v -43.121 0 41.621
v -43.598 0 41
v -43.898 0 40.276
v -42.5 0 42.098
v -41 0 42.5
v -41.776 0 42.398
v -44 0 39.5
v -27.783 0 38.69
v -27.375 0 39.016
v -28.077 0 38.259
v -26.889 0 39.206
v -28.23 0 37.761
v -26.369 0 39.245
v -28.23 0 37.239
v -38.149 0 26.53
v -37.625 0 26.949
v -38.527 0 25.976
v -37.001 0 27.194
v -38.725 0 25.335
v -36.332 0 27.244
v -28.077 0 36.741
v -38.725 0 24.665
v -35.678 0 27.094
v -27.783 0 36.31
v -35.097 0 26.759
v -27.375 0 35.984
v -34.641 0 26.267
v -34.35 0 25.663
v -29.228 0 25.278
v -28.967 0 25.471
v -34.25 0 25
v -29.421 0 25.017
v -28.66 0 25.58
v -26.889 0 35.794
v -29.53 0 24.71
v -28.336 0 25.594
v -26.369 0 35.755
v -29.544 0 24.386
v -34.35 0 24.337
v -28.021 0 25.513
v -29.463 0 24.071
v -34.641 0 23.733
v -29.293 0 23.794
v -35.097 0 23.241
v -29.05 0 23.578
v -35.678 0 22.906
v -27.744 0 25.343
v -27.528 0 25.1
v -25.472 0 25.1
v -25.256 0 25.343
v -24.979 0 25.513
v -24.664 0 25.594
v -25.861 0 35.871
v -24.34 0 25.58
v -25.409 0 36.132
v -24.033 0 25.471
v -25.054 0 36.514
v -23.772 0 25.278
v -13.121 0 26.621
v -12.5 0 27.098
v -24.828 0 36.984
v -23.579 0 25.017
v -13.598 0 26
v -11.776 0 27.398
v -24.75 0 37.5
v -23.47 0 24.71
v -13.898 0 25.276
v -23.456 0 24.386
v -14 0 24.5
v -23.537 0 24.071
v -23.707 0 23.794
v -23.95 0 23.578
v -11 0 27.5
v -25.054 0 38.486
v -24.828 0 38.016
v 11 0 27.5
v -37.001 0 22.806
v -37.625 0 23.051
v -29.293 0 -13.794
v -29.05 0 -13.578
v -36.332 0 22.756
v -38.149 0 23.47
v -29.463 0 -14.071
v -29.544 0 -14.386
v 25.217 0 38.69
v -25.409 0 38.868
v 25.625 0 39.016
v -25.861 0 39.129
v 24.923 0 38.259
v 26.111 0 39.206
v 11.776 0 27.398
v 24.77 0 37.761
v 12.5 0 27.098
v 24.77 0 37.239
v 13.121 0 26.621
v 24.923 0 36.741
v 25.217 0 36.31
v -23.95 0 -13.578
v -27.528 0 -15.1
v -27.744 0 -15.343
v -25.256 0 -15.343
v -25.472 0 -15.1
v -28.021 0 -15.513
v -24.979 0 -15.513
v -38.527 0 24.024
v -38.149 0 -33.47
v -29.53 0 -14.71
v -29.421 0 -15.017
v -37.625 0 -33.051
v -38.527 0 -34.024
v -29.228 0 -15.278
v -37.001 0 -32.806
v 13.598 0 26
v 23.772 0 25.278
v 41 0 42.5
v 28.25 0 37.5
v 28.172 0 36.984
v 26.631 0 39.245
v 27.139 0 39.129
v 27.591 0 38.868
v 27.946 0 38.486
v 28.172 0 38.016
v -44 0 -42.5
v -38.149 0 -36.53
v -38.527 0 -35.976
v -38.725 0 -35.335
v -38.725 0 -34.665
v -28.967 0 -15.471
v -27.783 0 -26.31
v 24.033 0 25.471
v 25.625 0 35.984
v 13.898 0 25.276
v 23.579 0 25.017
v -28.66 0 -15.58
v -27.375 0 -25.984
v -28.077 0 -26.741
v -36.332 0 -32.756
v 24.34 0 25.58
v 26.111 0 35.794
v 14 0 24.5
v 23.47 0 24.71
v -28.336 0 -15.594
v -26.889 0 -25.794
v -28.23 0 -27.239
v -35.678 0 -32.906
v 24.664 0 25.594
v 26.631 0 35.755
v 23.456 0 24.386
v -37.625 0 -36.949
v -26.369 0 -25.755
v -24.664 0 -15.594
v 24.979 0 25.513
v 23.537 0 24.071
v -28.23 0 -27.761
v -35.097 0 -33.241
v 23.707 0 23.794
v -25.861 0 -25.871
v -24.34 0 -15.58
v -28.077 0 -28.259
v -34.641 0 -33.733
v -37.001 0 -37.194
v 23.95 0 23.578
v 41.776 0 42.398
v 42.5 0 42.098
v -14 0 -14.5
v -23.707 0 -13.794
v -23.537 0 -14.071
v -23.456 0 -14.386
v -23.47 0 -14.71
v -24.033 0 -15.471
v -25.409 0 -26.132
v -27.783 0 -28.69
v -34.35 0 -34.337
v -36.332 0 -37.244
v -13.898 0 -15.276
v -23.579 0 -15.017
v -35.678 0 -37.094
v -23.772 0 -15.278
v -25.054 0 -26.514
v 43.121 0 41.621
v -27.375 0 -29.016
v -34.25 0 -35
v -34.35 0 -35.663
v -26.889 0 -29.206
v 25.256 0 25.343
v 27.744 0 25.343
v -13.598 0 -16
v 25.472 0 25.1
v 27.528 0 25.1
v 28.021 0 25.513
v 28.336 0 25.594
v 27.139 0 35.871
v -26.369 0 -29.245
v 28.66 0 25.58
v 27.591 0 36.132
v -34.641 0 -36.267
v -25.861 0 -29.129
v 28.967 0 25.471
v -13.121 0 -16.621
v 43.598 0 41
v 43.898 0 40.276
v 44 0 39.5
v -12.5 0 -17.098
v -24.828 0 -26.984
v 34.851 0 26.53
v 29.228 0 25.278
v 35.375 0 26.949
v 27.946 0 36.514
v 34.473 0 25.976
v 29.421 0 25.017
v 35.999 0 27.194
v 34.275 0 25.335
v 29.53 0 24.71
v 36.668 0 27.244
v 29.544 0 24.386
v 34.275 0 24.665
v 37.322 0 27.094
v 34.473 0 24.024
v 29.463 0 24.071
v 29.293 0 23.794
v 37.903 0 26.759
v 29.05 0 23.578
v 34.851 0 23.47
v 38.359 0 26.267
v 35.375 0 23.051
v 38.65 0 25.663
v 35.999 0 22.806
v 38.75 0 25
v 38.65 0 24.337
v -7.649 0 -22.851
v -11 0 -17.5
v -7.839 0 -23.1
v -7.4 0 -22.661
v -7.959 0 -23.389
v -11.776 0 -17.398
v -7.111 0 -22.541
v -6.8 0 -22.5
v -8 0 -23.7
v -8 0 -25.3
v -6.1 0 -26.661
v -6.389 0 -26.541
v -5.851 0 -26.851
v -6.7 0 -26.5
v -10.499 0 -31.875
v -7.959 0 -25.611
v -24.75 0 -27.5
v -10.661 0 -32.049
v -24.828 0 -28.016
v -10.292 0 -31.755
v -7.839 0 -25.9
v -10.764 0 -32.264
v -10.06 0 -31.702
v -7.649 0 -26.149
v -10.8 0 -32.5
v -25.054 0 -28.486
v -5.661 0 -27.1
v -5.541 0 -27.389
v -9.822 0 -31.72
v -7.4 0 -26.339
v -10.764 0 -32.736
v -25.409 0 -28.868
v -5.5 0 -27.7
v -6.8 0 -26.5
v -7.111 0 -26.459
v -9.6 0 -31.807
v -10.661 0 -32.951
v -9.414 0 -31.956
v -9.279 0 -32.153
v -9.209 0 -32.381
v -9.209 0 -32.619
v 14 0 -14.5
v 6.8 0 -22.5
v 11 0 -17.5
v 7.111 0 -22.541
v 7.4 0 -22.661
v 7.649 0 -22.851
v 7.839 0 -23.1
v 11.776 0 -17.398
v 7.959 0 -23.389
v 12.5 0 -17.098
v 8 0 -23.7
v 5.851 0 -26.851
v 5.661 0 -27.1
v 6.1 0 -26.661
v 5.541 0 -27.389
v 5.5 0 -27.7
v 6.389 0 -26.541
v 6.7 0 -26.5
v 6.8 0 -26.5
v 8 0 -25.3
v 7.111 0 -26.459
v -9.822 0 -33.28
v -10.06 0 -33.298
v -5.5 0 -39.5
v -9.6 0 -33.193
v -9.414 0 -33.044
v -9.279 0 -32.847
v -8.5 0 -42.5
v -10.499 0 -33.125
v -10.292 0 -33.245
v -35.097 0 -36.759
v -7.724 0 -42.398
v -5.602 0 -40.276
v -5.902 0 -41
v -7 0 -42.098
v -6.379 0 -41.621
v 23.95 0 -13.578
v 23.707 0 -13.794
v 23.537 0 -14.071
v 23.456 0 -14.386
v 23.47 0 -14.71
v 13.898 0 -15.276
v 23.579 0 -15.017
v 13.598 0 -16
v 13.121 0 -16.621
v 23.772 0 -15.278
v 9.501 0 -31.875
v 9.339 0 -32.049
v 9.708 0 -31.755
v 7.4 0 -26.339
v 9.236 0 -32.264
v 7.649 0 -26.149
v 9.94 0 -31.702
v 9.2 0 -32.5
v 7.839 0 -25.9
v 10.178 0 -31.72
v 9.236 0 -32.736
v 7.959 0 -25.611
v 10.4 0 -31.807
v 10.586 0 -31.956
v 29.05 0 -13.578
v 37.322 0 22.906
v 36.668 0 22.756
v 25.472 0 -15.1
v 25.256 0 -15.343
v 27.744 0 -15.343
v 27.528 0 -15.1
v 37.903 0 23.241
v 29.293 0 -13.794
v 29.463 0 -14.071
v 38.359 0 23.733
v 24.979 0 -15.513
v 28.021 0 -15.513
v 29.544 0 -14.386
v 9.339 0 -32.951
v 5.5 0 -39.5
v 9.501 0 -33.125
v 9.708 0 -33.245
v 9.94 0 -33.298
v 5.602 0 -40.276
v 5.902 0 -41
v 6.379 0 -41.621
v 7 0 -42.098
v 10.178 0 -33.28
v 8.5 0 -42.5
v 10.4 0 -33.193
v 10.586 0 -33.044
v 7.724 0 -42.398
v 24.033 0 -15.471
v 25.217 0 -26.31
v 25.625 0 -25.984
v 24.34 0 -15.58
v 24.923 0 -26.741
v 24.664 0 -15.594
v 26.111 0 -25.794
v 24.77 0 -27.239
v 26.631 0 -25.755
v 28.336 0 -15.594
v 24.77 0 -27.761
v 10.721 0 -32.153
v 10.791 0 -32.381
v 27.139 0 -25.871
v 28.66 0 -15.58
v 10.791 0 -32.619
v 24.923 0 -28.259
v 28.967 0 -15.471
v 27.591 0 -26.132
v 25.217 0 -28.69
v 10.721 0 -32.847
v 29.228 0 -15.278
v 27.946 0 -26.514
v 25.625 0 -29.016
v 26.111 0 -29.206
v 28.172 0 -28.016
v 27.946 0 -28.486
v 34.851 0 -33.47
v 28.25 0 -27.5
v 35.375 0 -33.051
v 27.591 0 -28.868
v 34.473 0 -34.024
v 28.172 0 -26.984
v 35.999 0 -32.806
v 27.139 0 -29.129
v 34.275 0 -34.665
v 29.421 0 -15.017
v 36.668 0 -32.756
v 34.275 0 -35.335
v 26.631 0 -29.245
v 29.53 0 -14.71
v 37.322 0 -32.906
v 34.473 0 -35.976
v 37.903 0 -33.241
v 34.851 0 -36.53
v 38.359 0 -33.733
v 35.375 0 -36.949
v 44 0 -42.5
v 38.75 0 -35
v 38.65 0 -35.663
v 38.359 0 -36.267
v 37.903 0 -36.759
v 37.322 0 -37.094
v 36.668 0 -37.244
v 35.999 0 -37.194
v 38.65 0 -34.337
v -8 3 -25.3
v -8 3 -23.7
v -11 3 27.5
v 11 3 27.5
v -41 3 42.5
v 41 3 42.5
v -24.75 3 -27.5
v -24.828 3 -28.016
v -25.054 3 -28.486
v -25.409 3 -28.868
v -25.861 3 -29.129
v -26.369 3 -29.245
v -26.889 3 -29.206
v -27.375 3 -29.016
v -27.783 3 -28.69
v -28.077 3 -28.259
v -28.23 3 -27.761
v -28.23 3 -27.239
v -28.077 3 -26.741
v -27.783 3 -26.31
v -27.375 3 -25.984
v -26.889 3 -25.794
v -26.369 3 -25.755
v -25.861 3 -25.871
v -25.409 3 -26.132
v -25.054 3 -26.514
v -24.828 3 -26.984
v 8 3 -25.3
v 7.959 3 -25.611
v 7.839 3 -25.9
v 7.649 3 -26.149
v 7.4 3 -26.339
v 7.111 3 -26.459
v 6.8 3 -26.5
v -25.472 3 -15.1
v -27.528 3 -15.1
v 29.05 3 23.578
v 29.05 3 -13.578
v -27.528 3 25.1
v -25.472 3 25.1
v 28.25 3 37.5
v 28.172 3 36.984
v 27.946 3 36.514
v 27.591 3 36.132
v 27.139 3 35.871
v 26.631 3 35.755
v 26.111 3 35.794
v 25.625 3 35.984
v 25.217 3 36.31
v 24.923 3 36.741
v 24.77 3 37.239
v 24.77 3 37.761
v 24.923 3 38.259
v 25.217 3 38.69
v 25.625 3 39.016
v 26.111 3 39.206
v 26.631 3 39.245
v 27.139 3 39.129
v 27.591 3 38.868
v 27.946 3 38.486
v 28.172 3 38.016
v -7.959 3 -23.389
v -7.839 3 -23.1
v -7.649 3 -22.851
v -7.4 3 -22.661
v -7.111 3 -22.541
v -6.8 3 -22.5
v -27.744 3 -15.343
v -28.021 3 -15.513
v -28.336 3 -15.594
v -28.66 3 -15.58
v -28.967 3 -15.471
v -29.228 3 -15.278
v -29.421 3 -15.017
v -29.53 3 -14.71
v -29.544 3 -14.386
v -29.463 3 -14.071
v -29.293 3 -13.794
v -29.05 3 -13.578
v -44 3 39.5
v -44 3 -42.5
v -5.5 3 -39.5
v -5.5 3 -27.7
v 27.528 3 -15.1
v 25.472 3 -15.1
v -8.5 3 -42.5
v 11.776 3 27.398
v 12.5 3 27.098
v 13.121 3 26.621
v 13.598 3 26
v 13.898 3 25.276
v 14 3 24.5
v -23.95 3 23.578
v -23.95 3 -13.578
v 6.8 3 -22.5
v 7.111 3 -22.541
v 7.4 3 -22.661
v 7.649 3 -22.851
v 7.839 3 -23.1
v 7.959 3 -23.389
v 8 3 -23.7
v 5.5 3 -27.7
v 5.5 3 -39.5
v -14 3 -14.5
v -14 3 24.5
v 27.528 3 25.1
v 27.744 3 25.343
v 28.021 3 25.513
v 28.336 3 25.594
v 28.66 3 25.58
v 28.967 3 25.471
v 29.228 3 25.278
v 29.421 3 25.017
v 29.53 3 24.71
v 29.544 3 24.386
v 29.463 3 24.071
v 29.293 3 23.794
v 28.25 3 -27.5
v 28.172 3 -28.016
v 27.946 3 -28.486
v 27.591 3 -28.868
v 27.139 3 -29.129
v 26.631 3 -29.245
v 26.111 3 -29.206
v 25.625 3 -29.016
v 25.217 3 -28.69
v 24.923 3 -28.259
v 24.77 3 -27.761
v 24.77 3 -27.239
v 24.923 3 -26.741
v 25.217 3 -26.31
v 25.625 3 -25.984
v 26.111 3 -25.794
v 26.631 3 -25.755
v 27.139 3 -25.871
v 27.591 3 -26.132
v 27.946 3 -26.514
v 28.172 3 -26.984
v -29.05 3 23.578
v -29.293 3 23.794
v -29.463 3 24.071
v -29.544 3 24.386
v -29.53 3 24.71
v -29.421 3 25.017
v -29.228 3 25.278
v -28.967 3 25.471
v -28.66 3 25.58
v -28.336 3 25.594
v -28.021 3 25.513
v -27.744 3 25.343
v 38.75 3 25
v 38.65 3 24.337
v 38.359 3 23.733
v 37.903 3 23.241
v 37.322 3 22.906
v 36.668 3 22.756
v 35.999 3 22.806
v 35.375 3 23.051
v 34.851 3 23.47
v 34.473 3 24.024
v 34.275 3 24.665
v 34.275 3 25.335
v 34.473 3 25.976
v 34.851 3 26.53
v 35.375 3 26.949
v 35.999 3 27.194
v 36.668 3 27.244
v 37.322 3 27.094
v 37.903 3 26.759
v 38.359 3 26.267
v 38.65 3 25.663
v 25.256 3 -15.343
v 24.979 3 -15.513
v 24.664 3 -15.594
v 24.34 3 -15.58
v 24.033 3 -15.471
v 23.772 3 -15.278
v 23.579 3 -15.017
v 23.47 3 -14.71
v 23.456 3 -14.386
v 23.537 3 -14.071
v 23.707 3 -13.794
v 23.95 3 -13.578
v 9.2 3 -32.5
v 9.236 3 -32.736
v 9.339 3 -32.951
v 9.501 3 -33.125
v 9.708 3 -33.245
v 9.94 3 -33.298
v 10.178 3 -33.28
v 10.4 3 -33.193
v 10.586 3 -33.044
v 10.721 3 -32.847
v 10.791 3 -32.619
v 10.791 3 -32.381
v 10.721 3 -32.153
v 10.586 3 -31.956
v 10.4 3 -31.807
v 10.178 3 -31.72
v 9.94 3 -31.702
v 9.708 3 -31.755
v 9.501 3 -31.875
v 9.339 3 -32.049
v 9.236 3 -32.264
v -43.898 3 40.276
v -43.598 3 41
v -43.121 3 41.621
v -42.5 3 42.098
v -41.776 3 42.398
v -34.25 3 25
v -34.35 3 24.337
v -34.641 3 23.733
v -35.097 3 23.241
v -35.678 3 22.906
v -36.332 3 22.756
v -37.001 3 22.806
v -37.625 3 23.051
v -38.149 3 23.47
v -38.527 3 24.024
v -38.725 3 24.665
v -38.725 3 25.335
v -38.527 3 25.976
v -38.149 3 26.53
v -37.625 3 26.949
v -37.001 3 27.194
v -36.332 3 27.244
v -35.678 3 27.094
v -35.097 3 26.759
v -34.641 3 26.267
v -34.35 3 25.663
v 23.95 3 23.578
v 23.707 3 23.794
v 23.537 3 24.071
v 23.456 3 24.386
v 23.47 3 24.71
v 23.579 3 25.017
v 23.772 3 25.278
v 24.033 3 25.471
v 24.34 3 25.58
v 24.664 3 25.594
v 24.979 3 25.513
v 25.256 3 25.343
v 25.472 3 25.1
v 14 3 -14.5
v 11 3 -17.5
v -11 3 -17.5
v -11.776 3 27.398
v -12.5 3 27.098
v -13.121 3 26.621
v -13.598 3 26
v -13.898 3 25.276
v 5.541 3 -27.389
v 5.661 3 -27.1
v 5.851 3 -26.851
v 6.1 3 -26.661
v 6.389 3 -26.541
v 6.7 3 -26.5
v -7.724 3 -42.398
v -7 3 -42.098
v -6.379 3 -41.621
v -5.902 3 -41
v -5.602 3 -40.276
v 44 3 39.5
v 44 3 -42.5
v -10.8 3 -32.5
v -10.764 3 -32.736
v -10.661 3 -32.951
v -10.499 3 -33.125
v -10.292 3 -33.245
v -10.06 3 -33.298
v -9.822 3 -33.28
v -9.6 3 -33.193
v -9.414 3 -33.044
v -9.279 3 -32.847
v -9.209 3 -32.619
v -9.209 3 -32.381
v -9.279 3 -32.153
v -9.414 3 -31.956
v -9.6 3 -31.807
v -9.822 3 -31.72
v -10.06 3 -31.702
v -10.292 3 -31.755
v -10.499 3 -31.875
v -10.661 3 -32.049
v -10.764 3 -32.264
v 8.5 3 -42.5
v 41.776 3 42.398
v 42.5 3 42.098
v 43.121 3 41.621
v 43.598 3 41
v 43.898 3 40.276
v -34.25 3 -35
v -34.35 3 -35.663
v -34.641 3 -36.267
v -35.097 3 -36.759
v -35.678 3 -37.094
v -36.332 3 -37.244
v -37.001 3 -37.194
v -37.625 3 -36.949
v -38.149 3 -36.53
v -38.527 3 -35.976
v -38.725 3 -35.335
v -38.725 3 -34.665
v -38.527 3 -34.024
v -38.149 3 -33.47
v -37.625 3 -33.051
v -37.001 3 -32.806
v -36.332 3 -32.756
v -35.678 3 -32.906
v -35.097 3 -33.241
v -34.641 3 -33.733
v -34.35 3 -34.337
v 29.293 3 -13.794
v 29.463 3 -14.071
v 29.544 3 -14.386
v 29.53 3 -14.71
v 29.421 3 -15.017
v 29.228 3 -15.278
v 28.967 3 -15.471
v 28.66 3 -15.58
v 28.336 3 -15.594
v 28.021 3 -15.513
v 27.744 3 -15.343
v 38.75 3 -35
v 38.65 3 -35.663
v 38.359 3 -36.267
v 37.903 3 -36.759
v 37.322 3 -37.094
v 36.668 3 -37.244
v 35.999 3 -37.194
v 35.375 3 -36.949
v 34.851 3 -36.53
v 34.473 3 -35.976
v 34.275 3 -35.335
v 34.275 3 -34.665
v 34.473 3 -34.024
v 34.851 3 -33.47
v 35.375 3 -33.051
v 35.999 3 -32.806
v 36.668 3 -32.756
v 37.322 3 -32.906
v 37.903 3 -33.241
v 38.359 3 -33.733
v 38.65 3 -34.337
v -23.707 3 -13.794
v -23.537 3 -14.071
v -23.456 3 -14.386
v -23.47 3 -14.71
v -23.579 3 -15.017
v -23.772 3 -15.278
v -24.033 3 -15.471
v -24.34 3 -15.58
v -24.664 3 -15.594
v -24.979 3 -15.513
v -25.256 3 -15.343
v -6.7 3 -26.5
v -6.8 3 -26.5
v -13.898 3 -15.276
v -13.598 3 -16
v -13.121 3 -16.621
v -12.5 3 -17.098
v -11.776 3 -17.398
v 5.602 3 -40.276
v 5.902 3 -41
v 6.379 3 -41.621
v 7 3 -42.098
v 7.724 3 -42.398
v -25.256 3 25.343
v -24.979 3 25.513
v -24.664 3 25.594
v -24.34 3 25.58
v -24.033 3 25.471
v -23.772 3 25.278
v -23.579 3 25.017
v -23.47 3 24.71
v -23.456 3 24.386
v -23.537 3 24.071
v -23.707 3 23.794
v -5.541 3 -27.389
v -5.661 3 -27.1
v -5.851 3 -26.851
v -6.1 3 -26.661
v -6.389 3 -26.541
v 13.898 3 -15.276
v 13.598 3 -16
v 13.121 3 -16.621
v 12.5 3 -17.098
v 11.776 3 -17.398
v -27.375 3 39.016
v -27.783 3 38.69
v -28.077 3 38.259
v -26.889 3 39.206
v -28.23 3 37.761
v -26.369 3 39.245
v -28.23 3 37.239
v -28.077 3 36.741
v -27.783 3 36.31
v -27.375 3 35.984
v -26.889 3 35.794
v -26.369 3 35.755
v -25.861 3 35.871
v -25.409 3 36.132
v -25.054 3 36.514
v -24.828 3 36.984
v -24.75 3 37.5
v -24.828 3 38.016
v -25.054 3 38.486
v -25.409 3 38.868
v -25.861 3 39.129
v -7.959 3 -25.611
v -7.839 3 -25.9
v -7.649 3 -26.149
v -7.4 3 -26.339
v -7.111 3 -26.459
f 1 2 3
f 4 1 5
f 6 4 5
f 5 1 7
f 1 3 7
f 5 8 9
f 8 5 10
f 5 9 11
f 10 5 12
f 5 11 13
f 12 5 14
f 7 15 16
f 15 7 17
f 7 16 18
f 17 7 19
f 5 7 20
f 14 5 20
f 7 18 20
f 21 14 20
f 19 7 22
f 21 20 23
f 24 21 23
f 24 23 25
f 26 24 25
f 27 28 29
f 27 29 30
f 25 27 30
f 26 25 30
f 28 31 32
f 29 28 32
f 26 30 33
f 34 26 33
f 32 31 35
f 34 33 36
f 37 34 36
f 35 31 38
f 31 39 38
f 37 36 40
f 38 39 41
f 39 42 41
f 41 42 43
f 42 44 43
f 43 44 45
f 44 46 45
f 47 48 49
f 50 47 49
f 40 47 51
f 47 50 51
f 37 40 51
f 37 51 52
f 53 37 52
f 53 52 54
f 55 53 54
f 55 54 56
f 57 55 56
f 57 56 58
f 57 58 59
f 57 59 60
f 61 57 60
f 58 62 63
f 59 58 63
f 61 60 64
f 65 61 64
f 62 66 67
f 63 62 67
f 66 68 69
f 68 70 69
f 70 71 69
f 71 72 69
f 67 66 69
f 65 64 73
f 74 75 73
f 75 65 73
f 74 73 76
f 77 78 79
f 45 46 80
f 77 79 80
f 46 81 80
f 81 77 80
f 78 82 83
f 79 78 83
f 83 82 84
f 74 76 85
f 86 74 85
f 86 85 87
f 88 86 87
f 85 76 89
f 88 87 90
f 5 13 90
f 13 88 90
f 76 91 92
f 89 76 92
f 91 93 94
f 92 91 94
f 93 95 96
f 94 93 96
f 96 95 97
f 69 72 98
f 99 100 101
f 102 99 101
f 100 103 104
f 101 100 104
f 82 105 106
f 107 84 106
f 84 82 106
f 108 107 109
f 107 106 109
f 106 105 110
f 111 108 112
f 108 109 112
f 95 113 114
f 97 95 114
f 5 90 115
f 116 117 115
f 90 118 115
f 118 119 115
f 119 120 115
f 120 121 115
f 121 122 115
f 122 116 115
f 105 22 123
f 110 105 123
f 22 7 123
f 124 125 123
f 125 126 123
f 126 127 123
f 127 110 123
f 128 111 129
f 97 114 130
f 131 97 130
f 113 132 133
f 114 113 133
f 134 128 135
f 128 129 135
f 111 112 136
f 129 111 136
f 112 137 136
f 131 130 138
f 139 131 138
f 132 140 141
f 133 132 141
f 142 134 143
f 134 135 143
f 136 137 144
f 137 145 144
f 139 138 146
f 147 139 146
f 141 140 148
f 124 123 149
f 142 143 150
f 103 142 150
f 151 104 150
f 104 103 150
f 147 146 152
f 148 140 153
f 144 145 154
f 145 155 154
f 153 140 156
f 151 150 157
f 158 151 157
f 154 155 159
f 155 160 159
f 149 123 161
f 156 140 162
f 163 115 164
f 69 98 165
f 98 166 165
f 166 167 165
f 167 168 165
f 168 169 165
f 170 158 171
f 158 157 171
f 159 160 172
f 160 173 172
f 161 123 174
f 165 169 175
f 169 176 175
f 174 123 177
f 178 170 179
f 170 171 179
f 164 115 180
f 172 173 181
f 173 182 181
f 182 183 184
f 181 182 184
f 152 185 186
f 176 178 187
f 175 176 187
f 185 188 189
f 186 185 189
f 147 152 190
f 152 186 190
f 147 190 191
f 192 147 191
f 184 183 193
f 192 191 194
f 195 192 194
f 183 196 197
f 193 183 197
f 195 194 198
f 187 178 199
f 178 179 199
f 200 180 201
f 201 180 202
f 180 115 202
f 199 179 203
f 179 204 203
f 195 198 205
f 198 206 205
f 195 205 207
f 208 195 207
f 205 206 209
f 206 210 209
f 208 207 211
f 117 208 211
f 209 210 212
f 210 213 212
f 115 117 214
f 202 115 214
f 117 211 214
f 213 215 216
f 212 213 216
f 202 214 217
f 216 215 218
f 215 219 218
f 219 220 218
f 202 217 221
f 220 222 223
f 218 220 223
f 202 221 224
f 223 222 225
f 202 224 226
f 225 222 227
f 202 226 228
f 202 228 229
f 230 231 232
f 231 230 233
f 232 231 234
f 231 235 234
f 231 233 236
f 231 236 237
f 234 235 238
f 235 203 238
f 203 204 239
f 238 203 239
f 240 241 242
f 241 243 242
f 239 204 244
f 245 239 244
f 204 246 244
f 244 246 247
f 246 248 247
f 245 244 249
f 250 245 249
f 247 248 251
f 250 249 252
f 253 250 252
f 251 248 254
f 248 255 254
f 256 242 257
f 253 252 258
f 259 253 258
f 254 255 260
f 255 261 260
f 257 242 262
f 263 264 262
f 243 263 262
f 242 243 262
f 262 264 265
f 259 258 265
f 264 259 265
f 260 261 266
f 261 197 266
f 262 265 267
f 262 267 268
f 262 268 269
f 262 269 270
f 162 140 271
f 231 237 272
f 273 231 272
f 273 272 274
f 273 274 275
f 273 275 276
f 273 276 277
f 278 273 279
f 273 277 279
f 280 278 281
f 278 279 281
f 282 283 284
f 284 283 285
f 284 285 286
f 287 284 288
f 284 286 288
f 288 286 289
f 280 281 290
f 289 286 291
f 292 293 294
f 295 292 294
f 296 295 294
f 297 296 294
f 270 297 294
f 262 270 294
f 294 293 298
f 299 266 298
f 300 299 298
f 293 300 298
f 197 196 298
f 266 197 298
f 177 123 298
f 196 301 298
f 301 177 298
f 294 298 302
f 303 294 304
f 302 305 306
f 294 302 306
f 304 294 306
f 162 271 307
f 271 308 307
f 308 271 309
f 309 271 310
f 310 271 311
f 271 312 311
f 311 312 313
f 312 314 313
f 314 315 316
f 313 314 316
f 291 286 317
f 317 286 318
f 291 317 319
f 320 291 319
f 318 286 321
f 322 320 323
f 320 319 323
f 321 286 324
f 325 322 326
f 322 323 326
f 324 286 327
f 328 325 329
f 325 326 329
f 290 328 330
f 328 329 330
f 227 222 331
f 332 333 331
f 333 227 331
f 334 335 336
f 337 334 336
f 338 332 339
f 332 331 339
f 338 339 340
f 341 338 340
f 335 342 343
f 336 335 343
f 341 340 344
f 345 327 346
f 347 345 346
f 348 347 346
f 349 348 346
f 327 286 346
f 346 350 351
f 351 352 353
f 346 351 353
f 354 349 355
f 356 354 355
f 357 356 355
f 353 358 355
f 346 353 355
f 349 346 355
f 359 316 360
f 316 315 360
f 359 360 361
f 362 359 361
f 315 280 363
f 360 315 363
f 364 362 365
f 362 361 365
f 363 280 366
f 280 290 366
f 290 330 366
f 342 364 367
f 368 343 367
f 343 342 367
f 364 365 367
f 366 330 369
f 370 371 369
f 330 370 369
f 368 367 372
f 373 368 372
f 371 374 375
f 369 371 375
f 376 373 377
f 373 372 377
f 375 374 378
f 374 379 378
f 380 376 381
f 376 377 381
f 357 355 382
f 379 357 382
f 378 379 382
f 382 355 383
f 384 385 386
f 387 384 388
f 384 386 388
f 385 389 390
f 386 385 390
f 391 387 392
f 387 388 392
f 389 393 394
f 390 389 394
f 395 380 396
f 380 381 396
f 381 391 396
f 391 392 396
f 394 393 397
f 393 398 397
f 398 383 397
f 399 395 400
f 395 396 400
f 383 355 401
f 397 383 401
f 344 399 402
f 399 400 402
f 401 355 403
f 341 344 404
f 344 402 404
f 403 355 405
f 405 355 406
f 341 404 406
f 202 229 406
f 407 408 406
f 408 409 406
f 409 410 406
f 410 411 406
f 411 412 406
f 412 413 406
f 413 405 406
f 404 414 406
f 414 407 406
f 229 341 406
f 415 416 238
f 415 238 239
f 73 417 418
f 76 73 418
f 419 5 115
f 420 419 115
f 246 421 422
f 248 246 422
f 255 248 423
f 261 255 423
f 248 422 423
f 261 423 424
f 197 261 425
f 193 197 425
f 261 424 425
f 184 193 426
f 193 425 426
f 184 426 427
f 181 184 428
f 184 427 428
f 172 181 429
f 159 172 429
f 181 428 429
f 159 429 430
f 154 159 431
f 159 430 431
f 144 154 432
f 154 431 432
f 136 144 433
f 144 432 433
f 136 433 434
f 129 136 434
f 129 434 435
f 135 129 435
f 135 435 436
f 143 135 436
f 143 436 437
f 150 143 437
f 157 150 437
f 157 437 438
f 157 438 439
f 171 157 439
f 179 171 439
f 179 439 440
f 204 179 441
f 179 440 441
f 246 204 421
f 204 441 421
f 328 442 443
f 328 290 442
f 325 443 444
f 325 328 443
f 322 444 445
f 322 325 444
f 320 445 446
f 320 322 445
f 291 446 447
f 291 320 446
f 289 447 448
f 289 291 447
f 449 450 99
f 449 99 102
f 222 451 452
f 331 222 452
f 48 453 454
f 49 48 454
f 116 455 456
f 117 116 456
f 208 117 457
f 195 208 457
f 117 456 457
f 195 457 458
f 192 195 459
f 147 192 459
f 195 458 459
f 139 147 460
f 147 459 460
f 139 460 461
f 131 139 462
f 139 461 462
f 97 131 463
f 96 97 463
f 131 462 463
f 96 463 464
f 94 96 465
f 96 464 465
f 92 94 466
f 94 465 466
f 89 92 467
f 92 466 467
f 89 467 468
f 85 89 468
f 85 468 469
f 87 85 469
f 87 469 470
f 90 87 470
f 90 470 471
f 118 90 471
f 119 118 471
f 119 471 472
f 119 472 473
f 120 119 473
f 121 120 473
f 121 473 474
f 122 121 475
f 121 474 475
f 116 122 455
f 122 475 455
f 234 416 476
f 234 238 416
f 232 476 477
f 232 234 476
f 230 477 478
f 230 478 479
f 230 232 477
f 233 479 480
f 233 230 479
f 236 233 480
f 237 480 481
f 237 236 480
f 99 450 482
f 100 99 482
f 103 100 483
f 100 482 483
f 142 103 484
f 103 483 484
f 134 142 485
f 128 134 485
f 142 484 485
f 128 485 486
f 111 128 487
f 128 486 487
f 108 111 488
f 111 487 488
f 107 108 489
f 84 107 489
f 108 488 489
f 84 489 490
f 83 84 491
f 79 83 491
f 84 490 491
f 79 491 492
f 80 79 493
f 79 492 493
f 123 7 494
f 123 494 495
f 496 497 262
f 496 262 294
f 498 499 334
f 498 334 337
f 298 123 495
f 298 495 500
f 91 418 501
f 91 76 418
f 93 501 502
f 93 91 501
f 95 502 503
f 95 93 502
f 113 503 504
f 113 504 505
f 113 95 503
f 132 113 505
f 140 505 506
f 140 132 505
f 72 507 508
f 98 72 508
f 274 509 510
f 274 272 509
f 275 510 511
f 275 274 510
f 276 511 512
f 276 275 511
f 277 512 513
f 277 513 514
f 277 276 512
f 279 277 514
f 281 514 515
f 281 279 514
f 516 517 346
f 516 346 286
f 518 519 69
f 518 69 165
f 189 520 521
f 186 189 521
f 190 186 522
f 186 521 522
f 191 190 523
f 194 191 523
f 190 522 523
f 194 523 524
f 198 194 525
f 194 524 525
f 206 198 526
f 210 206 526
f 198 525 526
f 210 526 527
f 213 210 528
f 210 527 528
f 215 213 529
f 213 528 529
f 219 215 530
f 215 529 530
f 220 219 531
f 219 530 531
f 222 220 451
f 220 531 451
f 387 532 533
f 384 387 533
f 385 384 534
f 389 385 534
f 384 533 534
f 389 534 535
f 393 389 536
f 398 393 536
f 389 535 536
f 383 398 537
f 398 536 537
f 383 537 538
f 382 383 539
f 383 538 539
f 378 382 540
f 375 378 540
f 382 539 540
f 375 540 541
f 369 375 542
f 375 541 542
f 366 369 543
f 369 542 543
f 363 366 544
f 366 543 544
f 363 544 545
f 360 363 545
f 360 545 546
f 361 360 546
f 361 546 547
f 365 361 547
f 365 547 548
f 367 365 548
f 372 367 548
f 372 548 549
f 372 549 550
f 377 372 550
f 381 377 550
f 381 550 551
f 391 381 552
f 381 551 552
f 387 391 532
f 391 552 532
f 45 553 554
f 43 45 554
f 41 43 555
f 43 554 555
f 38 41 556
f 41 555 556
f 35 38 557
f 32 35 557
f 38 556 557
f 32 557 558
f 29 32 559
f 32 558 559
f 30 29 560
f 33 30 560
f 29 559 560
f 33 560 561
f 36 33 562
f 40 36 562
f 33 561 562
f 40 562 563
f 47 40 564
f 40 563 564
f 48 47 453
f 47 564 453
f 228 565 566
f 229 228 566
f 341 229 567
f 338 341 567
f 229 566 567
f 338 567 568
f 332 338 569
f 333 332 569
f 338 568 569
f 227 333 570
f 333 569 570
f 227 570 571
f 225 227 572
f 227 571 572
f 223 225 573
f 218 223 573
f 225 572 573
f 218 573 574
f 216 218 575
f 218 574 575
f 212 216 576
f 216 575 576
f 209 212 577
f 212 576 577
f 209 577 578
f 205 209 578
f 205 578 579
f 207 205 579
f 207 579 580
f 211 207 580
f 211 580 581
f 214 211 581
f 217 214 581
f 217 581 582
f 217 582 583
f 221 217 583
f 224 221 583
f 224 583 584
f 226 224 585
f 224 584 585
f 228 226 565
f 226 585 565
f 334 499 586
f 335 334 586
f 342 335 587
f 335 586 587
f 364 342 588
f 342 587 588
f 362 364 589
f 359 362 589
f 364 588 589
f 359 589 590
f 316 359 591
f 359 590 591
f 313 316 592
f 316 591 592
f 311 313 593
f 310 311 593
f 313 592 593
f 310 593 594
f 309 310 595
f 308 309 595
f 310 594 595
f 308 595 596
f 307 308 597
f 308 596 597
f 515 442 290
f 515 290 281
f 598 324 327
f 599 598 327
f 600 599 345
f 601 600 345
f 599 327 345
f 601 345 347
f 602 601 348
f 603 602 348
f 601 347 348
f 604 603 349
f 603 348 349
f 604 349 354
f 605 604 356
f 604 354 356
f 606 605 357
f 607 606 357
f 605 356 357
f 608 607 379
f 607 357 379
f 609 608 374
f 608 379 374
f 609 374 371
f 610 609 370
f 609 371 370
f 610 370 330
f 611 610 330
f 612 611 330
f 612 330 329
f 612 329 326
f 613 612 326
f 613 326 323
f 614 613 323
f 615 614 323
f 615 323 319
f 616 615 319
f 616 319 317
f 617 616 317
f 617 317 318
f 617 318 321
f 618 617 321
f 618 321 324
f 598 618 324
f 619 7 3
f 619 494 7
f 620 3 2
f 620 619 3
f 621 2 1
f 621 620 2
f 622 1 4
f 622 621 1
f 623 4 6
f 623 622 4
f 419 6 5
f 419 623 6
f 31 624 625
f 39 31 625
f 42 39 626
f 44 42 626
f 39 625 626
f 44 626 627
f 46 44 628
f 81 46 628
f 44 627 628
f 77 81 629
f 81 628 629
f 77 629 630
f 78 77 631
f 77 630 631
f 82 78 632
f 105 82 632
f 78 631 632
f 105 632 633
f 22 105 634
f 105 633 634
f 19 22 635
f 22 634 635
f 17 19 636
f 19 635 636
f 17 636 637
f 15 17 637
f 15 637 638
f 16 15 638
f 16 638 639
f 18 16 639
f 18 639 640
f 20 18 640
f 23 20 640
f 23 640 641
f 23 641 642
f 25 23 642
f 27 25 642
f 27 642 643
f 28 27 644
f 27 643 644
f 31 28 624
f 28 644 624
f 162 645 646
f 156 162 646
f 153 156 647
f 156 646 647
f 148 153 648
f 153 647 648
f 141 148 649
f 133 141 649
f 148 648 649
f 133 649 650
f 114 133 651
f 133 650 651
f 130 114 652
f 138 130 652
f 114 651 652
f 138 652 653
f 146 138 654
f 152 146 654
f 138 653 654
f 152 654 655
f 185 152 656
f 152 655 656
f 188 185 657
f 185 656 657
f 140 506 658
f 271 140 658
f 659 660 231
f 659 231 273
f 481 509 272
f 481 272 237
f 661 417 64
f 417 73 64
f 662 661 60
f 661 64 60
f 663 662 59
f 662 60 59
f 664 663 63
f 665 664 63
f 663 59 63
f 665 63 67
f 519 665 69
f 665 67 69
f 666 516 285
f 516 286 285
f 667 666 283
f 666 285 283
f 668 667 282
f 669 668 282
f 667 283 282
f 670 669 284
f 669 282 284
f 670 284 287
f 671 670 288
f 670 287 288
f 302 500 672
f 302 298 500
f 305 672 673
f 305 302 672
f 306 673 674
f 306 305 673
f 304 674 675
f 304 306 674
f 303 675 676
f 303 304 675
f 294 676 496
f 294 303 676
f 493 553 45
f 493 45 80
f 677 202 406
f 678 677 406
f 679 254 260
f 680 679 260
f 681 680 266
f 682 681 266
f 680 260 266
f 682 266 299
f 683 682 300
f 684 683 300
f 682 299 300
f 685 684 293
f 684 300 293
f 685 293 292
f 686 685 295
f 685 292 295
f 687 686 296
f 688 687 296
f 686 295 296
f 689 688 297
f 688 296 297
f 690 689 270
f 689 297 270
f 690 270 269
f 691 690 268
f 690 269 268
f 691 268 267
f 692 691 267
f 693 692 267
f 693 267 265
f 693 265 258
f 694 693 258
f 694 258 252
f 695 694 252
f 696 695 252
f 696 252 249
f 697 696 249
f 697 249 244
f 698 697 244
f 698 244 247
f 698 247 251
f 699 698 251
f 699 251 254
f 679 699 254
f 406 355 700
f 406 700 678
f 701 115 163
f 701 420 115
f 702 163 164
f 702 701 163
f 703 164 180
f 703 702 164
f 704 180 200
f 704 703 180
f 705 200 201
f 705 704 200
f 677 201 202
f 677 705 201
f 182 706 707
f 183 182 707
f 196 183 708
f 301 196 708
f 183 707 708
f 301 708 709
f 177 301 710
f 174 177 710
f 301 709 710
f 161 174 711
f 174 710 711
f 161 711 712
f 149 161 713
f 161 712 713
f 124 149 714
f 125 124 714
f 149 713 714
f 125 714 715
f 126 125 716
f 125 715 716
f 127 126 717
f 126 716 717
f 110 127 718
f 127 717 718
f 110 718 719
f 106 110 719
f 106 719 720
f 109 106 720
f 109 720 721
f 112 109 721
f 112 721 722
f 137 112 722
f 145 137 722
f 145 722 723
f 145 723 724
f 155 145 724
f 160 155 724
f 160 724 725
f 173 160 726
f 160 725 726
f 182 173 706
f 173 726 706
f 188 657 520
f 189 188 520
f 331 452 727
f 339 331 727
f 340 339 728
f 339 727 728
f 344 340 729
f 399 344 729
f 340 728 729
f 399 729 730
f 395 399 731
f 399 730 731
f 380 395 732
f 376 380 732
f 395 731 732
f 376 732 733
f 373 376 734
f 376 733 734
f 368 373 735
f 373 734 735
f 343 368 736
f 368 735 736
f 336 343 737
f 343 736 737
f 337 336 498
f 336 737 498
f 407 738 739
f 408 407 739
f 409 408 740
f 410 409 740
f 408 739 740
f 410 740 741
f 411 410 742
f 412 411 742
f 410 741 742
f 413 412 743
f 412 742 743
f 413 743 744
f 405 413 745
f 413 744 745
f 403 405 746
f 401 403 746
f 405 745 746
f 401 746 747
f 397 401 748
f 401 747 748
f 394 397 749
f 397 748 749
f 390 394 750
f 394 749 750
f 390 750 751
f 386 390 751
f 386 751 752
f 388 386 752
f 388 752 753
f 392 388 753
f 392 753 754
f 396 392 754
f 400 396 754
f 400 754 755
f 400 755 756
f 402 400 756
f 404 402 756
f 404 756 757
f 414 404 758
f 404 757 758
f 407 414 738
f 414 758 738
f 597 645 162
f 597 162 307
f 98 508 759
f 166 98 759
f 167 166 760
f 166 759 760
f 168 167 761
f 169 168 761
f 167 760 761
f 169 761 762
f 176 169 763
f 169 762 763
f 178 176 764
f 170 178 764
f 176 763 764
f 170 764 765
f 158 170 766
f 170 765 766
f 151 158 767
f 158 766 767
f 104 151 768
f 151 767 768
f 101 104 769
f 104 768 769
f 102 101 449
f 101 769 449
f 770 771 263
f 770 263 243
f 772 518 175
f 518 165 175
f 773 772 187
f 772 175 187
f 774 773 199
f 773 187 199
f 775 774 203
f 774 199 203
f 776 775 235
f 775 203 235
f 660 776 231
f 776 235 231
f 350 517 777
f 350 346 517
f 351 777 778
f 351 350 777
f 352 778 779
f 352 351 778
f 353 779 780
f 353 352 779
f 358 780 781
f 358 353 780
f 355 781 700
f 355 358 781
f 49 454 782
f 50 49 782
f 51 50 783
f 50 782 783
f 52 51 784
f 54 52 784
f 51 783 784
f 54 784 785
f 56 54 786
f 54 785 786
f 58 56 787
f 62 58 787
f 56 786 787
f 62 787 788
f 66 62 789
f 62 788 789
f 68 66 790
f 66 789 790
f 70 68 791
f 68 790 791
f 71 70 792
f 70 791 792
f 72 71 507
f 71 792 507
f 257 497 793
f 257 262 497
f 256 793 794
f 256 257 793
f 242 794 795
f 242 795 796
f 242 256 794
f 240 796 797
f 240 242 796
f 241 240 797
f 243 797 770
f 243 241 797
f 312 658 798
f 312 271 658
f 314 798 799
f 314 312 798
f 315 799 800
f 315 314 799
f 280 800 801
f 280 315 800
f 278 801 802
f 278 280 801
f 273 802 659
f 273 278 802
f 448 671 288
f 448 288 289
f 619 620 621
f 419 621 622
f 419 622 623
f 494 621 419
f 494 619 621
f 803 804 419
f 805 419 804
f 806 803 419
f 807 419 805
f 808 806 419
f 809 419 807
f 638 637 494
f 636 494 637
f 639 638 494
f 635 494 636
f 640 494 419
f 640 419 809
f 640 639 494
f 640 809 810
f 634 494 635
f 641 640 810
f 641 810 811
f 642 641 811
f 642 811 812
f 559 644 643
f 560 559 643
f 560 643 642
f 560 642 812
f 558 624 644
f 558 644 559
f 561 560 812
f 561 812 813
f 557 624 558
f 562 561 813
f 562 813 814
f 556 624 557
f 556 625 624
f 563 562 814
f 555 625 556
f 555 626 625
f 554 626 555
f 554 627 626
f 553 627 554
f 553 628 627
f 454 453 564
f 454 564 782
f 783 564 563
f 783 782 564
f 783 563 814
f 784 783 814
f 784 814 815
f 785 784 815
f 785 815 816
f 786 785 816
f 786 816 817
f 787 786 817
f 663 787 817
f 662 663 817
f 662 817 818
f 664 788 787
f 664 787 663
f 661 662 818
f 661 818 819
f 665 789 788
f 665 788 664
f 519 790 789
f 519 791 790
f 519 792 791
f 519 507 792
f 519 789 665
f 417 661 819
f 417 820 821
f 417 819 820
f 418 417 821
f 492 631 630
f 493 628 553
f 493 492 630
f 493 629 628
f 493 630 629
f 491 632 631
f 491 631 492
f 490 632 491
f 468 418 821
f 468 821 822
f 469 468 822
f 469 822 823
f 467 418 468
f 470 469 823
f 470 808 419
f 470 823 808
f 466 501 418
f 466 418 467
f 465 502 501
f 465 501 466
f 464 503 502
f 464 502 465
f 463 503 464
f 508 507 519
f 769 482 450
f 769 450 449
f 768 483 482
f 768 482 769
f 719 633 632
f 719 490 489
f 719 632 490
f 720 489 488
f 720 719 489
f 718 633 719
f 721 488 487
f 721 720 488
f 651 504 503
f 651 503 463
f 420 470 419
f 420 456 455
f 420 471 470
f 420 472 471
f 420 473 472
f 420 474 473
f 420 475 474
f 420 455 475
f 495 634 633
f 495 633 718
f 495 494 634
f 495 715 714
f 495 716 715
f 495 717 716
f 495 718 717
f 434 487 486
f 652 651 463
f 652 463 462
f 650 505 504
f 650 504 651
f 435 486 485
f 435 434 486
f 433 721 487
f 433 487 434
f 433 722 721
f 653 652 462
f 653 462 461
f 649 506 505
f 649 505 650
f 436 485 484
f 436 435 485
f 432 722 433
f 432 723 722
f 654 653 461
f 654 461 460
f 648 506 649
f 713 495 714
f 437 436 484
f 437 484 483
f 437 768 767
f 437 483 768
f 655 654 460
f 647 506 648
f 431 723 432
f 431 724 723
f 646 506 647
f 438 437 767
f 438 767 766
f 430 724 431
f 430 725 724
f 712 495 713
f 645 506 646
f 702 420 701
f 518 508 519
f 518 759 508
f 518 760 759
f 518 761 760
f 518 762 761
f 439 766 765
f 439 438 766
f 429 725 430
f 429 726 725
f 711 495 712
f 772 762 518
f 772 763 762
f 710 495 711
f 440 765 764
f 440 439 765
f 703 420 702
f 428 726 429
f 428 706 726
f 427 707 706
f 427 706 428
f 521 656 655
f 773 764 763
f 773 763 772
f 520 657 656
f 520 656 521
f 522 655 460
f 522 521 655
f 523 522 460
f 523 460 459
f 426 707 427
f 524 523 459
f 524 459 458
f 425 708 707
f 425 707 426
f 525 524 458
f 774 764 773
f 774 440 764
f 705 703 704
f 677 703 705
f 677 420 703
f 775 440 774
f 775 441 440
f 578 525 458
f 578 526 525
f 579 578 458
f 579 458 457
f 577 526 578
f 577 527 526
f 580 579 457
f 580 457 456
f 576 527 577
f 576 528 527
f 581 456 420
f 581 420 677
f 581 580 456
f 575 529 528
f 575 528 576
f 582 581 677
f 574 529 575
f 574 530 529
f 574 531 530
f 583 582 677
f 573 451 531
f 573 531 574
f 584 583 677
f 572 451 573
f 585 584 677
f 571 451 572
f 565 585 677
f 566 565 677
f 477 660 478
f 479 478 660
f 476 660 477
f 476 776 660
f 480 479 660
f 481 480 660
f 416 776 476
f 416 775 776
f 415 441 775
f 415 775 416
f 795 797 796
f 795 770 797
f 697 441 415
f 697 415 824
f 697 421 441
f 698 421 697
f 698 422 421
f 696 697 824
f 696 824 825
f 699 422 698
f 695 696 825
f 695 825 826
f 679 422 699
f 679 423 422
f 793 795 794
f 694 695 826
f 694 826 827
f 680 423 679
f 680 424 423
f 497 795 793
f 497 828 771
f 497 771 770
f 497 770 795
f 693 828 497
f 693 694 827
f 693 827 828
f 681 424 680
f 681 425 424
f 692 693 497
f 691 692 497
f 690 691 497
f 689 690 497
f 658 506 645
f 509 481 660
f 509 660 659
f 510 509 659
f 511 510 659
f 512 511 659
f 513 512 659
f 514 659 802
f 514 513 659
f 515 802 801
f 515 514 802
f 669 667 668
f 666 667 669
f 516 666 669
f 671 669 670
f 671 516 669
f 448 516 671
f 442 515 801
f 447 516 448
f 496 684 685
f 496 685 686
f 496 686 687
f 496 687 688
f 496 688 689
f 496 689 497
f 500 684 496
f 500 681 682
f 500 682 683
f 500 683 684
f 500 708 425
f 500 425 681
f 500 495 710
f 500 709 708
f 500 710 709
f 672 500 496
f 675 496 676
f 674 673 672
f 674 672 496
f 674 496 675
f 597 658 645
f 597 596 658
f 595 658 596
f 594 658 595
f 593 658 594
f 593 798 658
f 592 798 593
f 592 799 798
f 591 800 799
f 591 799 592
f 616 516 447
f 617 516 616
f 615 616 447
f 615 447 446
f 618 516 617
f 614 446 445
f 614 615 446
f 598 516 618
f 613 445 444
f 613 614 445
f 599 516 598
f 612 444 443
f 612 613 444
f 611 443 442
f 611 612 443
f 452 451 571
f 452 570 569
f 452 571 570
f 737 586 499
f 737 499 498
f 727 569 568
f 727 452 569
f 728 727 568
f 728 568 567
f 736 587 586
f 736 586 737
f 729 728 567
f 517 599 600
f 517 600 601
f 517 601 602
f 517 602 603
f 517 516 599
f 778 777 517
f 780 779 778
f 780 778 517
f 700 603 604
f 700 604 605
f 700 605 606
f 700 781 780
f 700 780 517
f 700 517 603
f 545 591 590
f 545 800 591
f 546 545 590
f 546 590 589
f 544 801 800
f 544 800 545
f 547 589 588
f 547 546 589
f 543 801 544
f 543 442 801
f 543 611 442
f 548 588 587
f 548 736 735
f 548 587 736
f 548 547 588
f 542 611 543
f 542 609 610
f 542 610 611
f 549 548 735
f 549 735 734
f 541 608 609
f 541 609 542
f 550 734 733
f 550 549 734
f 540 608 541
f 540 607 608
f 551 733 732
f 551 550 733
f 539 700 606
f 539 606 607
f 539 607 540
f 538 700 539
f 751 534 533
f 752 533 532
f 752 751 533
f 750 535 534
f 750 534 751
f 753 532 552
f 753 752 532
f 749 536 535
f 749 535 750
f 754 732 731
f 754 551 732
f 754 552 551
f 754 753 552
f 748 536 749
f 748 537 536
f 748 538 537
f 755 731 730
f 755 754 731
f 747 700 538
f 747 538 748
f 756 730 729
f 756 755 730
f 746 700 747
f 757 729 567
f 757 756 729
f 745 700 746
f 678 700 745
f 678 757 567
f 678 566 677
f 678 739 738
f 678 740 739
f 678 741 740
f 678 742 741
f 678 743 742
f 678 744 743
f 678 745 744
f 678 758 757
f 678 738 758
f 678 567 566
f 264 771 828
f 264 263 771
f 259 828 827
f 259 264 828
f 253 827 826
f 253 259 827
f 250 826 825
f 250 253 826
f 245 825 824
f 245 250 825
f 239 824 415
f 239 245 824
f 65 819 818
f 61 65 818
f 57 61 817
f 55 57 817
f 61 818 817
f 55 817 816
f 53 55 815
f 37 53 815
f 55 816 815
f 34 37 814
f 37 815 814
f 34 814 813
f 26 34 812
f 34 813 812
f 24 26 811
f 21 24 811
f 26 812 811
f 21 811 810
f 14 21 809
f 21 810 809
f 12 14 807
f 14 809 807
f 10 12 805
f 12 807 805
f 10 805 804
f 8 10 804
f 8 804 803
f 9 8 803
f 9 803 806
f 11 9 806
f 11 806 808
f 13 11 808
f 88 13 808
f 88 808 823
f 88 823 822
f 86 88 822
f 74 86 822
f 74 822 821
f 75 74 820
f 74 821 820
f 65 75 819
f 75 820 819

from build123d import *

# Parameters (mm, degrees)
SKETCH_1_W          = 88
SKETCH_1_H          = 85
EXTRUDE_1_DEPTH     = 3
SKETCH_2_R          = 1.75
SKETCH_2_R_2        = 1.1
SKETCH_2_W          = 5.1
SKETCH_2_H          = 40.2
SKETCH_2_R_3        = 2.25
SKETCH_2_W_2        = 28
SKETCH_2_H_2        = 45
CUT_EXTRUDE_1_DEPTH = 3
M2X0_4_1_D          = 1.6
M2X0_4_1_DEPTH      = 6
M2X0_4_1_TIP        = 0.480688495
CUT_EXTRUDE_2_DEPTH = 4
FILLET_7_R          = 3
FILLET_6_R          = 1.2


with BuildPart() as part:
    # ｽｹｯﾁ1 → ﾎﾞｽ - 押し出し1 (new body)
    with BuildSketch(Plane(origin=(0, 0, 0), x_dir=(1, 0, 0), z_dir=(0, 1, 0))):
        Rectangle(SKETCH_1_W, SKETCH_1_H)
    extrude(amount=EXTRUDE_1_DEPTH)

    # ｽｹｯﾁ2 → ｶｯﾄ - 押し出し1 (cut)
    with BuildSketch(Plane(origin=(0, 3, 0), x_dir=(1, 0, 0), z_dir=(0, 1, 0))):
        with Locations((-26.5, 27.5)):
            Circle(SKETCH_2_R)
        with Locations((26.5, 27.5)):
            Circle(SKETCH_2_R)
        with Locations((-28.45, -24.5)):
            Circle(SKETCH_2_R_2)
        with Locations((-24.55, -24.5)):
            Circle(SKETCH_2_R_2)
        with Locations((-26.5, -5)):
            Rectangle(SKETCH_2_W, SKETCH_2_H)
        with Locations((-28.45, 14.5)):
            Circle(SKETCH_2_R_2)
        with Locations((-24.55, 14.5)):
            Circle(SKETCH_2_R_2)
        with Locations((26.5, -5)):
            Rectangle(SKETCH_2_W, SKETCH_2_H)
        with Locations((24.55, 14.5)):
            Circle(SKETCH_2_R_2)
        with Locations((28.45, 14.5)):
            Circle(SKETCH_2_R_2)
        with Locations((24.55, -24.5)):
            Circle(SKETCH_2_R_2)
        with Locations((28.45, -24.5)):
            Circle(SKETCH_2_R_2)
        with Locations((-26.5, -37.5)):
            Circle(SKETCH_2_R)
        with Locations((26.5, -37.5)):
            Circle(SKETCH_2_R)
        with Locations((-36.5, -25)):
            Circle(SKETCH_2_R_3)
        with Locations((-36.5, 35)):
            Circle(SKETCH_2_R_3)
        with Locations((36.5, 35)):
            Circle(SKETCH_2_R_3)
        with Locations((36.5, -25)):
            Circle(SKETCH_2_R_3)
        with Locations((0, -5)):
            Rectangle(SKETCH_2_W_2, SKETCH_2_H_2)
    extrude(amount=-CUT_EXTRUDE_1_DEPTH, mode=Mode.SUBTRACT)

    # M2x0.4 ねじ穴1
    with Locations(Plane(origin=(0, 3, 0), x_dir=(1, 0, 0), z_dir=(0, 1, 0))):
        with Locations((-10, 32.5), (10, 32.5)):
            Hole(M2X0_4_1_D / 2, depth=M2X0_4_1_DEPTH)
            with Locations((0, 0, -(M2X0_4_1_DEPTH + M2X0_4_1_TIP / 2))):  # 118° drill point
                Cone(0, M2X0_4_1_D / 2, M2X0_4_1_TIP, mode=Mode.SUBTRACT)

    # ｽｹｯﾁ5 → ｶｯﾄ - 押し出し2 (cut, through all)
    with BuildSketch(Plane(origin=(0, 3, 0), x_dir=(1, 0, 0), z_dir=(0, 1, 0))):
        Polygon((-5.5, 42.5), (5.5, 42.5), (5.5, 26.5), (8, 26.5), (8, 22.5), (-8, 22.5), (-8, 26.5), (-5.5, 26.5), align=None)
    extrude(amount=-CUT_EXTRUDE_2_DEPTH, mode=Mode.SUBTRACT)

    # ﾌｨﾚｯﾄ7
    fillet_7_edges = [part.edges().sort_by_distance(p)[0] for p in [
        (-5.5, 1.5, -42.5),
        (5.5, 1.5, -42.5),
        (-14, 1.5, -17.5),
        (14, 1.5, -17.5),
        (14, 1.5, 27.5),
        (-14, 1.5, 27.5),
        (44, 1.5, 42.5),
        (-44, 1.5, 42.5),
    ]]
    fillet(fillet_7_edges, radius=FILLET_7_R)

    # ﾌｨﾚｯﾄ6
    fillet_6_edges = [part.edges().sort_by_distance(p)[0] for p in [
        (5.5, 1.5, -26.5),
        (8, 1.5, -26.5),
        (8, 1.5, -22.5),
        (-8, 1.5, -22.5),
        (-8, 1.5, -26.5),
        (-5.5, 1.5, -26.5),
    ]]
    fillet(fillet_6_edges, radius=FILLET_6_R)


solid = part.part
